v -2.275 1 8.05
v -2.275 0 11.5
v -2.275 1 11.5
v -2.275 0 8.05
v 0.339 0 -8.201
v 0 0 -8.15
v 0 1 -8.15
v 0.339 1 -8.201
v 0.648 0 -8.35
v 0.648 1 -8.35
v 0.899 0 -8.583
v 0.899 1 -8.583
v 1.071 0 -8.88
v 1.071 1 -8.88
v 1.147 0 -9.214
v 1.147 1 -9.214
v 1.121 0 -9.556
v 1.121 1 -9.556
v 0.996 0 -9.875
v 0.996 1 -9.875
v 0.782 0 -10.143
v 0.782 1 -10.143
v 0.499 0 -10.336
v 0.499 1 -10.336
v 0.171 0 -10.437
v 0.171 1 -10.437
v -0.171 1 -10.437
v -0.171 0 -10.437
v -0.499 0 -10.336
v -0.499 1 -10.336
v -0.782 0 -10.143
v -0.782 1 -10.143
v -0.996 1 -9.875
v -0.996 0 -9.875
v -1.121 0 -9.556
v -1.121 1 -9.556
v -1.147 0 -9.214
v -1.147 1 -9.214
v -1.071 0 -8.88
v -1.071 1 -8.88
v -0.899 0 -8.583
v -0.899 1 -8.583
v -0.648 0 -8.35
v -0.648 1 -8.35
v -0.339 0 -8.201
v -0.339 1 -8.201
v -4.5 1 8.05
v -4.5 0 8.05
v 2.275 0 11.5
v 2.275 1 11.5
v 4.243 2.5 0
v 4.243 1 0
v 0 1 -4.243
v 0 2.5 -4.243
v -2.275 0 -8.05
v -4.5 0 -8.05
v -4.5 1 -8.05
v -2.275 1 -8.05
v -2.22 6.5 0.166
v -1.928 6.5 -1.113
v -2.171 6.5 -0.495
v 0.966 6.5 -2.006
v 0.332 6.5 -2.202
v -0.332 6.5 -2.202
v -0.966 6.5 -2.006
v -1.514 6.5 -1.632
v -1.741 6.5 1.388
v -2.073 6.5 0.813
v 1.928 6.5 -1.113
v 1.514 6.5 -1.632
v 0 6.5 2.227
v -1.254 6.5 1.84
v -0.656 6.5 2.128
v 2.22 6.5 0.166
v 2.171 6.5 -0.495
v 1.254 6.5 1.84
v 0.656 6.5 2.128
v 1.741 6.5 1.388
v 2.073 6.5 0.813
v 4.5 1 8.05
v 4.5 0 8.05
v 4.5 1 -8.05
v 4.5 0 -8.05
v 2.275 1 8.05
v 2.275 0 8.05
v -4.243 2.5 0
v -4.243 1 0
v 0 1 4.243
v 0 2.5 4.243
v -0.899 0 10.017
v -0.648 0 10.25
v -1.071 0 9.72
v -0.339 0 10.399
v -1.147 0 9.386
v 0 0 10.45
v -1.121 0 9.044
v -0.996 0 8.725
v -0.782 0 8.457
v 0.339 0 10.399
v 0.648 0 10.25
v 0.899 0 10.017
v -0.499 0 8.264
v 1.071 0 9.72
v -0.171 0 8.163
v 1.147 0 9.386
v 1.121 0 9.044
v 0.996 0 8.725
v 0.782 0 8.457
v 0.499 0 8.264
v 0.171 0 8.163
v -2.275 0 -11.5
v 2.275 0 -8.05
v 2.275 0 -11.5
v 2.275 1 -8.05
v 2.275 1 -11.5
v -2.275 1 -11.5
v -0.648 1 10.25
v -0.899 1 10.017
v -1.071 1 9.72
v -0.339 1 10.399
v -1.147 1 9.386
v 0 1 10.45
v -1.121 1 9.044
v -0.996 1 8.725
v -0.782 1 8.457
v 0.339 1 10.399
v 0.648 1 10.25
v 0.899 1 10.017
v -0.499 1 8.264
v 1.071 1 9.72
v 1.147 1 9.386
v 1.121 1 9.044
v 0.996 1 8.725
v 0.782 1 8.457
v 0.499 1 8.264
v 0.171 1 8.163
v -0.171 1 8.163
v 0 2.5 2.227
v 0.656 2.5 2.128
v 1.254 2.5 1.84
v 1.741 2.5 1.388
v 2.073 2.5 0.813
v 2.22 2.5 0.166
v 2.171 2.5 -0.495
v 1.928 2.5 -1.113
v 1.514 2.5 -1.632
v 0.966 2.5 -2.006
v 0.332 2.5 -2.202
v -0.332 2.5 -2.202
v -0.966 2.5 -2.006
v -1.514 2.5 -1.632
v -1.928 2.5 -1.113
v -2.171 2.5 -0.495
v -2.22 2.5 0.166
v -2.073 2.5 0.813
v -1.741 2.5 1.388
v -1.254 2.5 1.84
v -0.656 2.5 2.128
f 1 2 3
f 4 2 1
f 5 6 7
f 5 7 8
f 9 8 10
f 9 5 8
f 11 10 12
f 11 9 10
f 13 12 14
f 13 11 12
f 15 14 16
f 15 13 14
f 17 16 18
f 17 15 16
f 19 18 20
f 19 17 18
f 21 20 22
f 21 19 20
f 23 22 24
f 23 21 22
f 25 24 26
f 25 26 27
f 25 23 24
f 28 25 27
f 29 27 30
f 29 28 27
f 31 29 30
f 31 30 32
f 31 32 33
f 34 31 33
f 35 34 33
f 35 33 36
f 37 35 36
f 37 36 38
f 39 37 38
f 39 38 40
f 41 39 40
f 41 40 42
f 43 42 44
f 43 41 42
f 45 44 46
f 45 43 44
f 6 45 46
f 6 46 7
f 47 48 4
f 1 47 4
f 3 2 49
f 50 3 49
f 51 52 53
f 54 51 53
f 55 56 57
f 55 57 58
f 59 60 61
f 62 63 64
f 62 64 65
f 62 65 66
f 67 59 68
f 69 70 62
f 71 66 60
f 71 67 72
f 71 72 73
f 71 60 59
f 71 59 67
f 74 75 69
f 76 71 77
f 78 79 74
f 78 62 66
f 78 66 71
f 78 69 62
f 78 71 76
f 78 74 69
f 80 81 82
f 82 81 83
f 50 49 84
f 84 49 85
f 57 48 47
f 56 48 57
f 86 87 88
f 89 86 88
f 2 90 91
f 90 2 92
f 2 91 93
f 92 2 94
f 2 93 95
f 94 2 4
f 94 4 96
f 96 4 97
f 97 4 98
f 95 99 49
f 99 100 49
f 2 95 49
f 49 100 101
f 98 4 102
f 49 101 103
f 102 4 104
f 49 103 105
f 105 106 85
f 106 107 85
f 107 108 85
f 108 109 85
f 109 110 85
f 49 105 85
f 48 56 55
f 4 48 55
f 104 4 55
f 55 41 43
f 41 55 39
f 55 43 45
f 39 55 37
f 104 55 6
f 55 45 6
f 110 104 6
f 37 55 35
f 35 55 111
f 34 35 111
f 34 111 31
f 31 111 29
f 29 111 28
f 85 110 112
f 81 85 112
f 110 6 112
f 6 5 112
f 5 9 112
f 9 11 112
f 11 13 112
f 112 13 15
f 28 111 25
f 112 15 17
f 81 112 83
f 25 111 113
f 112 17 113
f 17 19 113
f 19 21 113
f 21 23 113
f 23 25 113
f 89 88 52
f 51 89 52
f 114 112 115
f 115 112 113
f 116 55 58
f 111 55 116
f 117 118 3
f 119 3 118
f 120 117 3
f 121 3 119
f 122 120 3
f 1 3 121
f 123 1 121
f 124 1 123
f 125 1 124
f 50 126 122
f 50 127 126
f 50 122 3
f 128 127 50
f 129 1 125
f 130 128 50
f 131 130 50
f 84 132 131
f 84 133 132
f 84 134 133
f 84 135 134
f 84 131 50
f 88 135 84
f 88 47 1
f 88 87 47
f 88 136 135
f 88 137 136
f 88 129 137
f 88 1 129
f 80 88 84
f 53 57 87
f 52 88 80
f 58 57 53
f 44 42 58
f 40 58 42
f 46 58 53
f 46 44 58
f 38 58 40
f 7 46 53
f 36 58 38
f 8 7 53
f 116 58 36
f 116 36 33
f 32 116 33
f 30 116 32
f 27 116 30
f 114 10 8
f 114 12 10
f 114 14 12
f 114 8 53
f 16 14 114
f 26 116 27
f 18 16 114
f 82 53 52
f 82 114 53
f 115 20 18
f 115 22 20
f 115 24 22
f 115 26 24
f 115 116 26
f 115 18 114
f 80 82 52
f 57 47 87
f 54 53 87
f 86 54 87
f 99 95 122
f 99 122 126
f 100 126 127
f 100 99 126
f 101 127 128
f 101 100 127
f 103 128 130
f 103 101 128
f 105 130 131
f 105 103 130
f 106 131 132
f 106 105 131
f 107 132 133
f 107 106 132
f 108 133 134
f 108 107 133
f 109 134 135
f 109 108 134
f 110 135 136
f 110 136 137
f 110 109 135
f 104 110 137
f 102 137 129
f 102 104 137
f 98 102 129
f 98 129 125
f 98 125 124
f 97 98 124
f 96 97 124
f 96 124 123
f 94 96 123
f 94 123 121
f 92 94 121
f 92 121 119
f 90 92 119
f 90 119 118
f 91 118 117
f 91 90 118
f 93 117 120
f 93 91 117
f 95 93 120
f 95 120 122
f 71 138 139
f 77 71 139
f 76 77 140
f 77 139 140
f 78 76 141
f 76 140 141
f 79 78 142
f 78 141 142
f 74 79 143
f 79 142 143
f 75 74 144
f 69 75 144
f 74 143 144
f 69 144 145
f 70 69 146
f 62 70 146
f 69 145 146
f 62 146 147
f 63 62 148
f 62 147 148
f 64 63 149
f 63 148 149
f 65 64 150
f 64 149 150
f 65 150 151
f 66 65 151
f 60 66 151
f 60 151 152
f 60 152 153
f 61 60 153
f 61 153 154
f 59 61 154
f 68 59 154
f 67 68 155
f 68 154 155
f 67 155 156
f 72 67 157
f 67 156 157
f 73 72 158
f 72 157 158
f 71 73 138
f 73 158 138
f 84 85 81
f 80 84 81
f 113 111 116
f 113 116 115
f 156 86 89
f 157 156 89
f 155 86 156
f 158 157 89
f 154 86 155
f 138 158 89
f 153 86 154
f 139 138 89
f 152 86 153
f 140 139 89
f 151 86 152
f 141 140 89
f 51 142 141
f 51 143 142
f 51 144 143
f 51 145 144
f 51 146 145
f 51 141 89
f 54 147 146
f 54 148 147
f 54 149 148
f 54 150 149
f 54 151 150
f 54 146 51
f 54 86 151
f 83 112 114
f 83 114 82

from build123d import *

# Parameters (mm, degrees)
SKETCH1_W           = 2.225
SKETCH1_H           = 16.1
SKETCH1_W_2         = 4.55
SKETCH1_H_2         = 3.45
SKETCH1_R           = 1.15
BOSS_EXTRUDE1_DEPTH = 1
BOSS_EXTRUDE2_DEPTH = 1.5
SKETCH3_R           = 2.226640197
BOSS_EXTRUDE3_DEPTH = 4


with BuildPart() as part:
    # Sketch1 → Boss-Extrude1 (new body)
    # profile 1 of 5: a face of its own
    with BuildSketch(Plane(origin=(0, 0, 0), x_dir=(1, 0, 0), z_dir=(0, 1, 0))):
        with Locations((-3.3875, 0)):
            Rectangle(SKETCH1_W, SKETCH1_H)
    # profile 2 of 5: a face of its own
    with BuildSketch(Plane(origin=(0, 0, 0), x_dir=(1, 0, 0), z_dir=(0, 1, 0))):
        with Locations((0, 9.775)):
            Rectangle(SKETCH1_W_2, SKETCH1_H_2)
        with Locations(Location((0, 9.3, 0), (0, 0, 270))):
            Circle(SKETCH1_R, mode=Mode.SUBTRACT)
    # profile 3 of 5: a face of its own
    with BuildSketch(Plane(origin=(0, 0, 0), x_dir=(1, 0, 0), z_dir=(0, 1, 0))):
        Rectangle(SKETCH1_W_2, SKETCH1_H)
    # profile 4 of 5: a face of its own
    with BuildSketch(Plane(origin=(0, 0, 0), x_dir=(1, 0, 0), z_dir=(0, 1, 0))):
        with Locations((3.3875, 0)):
            Rectangle(SKETCH1_W, SKETCH1_H)
    # profile 5 of 5: a face of its own
    with BuildSketch(Plane(origin=(0, 0, 0), x_dir=(1, 0, 0), z_dir=(0, 1, 0))):
        with Locations((0, -9.775)):
            Rectangle(SKETCH1_W_2, SKETCH1_H_2)
        with Locations(Location((0, -9.3, 0), (0, 0, 270))):
            Circle(SKETCH1_R, mode=Mode.SUBTRACT)
    extrude(amount=BOSS_EXTRUDE1_DEPTH)

    # Sketch2 → Boss-Extrude2 (add)
    with BuildSketch(Plane(origin=(0, 1, 0), x_dir=(1, 0, 0), z_dir=(0, 1, 0))):
        Polygon((0, -4.242640687), (4.242640687, 0), (0, 4.242640687), (-4.242640687, 0), align=None)
    extrude(amount=BOSS_EXTRUDE2_DEPTH)

    # Sketch3 → Boss-Extrude3 (add)
    with BuildSketch(Plane(origin=(0, 2.5, 0), x_dir=(1, 0, 0), z_dir=(0, 1, 0))):
        with Locations(Location((0, 0, 0), (0, 0, 270))):
            Circle(SKETCH3_R)
    extrude(amount=BOSS_EXTRUDE3_DEPTH)


solid = part.part
